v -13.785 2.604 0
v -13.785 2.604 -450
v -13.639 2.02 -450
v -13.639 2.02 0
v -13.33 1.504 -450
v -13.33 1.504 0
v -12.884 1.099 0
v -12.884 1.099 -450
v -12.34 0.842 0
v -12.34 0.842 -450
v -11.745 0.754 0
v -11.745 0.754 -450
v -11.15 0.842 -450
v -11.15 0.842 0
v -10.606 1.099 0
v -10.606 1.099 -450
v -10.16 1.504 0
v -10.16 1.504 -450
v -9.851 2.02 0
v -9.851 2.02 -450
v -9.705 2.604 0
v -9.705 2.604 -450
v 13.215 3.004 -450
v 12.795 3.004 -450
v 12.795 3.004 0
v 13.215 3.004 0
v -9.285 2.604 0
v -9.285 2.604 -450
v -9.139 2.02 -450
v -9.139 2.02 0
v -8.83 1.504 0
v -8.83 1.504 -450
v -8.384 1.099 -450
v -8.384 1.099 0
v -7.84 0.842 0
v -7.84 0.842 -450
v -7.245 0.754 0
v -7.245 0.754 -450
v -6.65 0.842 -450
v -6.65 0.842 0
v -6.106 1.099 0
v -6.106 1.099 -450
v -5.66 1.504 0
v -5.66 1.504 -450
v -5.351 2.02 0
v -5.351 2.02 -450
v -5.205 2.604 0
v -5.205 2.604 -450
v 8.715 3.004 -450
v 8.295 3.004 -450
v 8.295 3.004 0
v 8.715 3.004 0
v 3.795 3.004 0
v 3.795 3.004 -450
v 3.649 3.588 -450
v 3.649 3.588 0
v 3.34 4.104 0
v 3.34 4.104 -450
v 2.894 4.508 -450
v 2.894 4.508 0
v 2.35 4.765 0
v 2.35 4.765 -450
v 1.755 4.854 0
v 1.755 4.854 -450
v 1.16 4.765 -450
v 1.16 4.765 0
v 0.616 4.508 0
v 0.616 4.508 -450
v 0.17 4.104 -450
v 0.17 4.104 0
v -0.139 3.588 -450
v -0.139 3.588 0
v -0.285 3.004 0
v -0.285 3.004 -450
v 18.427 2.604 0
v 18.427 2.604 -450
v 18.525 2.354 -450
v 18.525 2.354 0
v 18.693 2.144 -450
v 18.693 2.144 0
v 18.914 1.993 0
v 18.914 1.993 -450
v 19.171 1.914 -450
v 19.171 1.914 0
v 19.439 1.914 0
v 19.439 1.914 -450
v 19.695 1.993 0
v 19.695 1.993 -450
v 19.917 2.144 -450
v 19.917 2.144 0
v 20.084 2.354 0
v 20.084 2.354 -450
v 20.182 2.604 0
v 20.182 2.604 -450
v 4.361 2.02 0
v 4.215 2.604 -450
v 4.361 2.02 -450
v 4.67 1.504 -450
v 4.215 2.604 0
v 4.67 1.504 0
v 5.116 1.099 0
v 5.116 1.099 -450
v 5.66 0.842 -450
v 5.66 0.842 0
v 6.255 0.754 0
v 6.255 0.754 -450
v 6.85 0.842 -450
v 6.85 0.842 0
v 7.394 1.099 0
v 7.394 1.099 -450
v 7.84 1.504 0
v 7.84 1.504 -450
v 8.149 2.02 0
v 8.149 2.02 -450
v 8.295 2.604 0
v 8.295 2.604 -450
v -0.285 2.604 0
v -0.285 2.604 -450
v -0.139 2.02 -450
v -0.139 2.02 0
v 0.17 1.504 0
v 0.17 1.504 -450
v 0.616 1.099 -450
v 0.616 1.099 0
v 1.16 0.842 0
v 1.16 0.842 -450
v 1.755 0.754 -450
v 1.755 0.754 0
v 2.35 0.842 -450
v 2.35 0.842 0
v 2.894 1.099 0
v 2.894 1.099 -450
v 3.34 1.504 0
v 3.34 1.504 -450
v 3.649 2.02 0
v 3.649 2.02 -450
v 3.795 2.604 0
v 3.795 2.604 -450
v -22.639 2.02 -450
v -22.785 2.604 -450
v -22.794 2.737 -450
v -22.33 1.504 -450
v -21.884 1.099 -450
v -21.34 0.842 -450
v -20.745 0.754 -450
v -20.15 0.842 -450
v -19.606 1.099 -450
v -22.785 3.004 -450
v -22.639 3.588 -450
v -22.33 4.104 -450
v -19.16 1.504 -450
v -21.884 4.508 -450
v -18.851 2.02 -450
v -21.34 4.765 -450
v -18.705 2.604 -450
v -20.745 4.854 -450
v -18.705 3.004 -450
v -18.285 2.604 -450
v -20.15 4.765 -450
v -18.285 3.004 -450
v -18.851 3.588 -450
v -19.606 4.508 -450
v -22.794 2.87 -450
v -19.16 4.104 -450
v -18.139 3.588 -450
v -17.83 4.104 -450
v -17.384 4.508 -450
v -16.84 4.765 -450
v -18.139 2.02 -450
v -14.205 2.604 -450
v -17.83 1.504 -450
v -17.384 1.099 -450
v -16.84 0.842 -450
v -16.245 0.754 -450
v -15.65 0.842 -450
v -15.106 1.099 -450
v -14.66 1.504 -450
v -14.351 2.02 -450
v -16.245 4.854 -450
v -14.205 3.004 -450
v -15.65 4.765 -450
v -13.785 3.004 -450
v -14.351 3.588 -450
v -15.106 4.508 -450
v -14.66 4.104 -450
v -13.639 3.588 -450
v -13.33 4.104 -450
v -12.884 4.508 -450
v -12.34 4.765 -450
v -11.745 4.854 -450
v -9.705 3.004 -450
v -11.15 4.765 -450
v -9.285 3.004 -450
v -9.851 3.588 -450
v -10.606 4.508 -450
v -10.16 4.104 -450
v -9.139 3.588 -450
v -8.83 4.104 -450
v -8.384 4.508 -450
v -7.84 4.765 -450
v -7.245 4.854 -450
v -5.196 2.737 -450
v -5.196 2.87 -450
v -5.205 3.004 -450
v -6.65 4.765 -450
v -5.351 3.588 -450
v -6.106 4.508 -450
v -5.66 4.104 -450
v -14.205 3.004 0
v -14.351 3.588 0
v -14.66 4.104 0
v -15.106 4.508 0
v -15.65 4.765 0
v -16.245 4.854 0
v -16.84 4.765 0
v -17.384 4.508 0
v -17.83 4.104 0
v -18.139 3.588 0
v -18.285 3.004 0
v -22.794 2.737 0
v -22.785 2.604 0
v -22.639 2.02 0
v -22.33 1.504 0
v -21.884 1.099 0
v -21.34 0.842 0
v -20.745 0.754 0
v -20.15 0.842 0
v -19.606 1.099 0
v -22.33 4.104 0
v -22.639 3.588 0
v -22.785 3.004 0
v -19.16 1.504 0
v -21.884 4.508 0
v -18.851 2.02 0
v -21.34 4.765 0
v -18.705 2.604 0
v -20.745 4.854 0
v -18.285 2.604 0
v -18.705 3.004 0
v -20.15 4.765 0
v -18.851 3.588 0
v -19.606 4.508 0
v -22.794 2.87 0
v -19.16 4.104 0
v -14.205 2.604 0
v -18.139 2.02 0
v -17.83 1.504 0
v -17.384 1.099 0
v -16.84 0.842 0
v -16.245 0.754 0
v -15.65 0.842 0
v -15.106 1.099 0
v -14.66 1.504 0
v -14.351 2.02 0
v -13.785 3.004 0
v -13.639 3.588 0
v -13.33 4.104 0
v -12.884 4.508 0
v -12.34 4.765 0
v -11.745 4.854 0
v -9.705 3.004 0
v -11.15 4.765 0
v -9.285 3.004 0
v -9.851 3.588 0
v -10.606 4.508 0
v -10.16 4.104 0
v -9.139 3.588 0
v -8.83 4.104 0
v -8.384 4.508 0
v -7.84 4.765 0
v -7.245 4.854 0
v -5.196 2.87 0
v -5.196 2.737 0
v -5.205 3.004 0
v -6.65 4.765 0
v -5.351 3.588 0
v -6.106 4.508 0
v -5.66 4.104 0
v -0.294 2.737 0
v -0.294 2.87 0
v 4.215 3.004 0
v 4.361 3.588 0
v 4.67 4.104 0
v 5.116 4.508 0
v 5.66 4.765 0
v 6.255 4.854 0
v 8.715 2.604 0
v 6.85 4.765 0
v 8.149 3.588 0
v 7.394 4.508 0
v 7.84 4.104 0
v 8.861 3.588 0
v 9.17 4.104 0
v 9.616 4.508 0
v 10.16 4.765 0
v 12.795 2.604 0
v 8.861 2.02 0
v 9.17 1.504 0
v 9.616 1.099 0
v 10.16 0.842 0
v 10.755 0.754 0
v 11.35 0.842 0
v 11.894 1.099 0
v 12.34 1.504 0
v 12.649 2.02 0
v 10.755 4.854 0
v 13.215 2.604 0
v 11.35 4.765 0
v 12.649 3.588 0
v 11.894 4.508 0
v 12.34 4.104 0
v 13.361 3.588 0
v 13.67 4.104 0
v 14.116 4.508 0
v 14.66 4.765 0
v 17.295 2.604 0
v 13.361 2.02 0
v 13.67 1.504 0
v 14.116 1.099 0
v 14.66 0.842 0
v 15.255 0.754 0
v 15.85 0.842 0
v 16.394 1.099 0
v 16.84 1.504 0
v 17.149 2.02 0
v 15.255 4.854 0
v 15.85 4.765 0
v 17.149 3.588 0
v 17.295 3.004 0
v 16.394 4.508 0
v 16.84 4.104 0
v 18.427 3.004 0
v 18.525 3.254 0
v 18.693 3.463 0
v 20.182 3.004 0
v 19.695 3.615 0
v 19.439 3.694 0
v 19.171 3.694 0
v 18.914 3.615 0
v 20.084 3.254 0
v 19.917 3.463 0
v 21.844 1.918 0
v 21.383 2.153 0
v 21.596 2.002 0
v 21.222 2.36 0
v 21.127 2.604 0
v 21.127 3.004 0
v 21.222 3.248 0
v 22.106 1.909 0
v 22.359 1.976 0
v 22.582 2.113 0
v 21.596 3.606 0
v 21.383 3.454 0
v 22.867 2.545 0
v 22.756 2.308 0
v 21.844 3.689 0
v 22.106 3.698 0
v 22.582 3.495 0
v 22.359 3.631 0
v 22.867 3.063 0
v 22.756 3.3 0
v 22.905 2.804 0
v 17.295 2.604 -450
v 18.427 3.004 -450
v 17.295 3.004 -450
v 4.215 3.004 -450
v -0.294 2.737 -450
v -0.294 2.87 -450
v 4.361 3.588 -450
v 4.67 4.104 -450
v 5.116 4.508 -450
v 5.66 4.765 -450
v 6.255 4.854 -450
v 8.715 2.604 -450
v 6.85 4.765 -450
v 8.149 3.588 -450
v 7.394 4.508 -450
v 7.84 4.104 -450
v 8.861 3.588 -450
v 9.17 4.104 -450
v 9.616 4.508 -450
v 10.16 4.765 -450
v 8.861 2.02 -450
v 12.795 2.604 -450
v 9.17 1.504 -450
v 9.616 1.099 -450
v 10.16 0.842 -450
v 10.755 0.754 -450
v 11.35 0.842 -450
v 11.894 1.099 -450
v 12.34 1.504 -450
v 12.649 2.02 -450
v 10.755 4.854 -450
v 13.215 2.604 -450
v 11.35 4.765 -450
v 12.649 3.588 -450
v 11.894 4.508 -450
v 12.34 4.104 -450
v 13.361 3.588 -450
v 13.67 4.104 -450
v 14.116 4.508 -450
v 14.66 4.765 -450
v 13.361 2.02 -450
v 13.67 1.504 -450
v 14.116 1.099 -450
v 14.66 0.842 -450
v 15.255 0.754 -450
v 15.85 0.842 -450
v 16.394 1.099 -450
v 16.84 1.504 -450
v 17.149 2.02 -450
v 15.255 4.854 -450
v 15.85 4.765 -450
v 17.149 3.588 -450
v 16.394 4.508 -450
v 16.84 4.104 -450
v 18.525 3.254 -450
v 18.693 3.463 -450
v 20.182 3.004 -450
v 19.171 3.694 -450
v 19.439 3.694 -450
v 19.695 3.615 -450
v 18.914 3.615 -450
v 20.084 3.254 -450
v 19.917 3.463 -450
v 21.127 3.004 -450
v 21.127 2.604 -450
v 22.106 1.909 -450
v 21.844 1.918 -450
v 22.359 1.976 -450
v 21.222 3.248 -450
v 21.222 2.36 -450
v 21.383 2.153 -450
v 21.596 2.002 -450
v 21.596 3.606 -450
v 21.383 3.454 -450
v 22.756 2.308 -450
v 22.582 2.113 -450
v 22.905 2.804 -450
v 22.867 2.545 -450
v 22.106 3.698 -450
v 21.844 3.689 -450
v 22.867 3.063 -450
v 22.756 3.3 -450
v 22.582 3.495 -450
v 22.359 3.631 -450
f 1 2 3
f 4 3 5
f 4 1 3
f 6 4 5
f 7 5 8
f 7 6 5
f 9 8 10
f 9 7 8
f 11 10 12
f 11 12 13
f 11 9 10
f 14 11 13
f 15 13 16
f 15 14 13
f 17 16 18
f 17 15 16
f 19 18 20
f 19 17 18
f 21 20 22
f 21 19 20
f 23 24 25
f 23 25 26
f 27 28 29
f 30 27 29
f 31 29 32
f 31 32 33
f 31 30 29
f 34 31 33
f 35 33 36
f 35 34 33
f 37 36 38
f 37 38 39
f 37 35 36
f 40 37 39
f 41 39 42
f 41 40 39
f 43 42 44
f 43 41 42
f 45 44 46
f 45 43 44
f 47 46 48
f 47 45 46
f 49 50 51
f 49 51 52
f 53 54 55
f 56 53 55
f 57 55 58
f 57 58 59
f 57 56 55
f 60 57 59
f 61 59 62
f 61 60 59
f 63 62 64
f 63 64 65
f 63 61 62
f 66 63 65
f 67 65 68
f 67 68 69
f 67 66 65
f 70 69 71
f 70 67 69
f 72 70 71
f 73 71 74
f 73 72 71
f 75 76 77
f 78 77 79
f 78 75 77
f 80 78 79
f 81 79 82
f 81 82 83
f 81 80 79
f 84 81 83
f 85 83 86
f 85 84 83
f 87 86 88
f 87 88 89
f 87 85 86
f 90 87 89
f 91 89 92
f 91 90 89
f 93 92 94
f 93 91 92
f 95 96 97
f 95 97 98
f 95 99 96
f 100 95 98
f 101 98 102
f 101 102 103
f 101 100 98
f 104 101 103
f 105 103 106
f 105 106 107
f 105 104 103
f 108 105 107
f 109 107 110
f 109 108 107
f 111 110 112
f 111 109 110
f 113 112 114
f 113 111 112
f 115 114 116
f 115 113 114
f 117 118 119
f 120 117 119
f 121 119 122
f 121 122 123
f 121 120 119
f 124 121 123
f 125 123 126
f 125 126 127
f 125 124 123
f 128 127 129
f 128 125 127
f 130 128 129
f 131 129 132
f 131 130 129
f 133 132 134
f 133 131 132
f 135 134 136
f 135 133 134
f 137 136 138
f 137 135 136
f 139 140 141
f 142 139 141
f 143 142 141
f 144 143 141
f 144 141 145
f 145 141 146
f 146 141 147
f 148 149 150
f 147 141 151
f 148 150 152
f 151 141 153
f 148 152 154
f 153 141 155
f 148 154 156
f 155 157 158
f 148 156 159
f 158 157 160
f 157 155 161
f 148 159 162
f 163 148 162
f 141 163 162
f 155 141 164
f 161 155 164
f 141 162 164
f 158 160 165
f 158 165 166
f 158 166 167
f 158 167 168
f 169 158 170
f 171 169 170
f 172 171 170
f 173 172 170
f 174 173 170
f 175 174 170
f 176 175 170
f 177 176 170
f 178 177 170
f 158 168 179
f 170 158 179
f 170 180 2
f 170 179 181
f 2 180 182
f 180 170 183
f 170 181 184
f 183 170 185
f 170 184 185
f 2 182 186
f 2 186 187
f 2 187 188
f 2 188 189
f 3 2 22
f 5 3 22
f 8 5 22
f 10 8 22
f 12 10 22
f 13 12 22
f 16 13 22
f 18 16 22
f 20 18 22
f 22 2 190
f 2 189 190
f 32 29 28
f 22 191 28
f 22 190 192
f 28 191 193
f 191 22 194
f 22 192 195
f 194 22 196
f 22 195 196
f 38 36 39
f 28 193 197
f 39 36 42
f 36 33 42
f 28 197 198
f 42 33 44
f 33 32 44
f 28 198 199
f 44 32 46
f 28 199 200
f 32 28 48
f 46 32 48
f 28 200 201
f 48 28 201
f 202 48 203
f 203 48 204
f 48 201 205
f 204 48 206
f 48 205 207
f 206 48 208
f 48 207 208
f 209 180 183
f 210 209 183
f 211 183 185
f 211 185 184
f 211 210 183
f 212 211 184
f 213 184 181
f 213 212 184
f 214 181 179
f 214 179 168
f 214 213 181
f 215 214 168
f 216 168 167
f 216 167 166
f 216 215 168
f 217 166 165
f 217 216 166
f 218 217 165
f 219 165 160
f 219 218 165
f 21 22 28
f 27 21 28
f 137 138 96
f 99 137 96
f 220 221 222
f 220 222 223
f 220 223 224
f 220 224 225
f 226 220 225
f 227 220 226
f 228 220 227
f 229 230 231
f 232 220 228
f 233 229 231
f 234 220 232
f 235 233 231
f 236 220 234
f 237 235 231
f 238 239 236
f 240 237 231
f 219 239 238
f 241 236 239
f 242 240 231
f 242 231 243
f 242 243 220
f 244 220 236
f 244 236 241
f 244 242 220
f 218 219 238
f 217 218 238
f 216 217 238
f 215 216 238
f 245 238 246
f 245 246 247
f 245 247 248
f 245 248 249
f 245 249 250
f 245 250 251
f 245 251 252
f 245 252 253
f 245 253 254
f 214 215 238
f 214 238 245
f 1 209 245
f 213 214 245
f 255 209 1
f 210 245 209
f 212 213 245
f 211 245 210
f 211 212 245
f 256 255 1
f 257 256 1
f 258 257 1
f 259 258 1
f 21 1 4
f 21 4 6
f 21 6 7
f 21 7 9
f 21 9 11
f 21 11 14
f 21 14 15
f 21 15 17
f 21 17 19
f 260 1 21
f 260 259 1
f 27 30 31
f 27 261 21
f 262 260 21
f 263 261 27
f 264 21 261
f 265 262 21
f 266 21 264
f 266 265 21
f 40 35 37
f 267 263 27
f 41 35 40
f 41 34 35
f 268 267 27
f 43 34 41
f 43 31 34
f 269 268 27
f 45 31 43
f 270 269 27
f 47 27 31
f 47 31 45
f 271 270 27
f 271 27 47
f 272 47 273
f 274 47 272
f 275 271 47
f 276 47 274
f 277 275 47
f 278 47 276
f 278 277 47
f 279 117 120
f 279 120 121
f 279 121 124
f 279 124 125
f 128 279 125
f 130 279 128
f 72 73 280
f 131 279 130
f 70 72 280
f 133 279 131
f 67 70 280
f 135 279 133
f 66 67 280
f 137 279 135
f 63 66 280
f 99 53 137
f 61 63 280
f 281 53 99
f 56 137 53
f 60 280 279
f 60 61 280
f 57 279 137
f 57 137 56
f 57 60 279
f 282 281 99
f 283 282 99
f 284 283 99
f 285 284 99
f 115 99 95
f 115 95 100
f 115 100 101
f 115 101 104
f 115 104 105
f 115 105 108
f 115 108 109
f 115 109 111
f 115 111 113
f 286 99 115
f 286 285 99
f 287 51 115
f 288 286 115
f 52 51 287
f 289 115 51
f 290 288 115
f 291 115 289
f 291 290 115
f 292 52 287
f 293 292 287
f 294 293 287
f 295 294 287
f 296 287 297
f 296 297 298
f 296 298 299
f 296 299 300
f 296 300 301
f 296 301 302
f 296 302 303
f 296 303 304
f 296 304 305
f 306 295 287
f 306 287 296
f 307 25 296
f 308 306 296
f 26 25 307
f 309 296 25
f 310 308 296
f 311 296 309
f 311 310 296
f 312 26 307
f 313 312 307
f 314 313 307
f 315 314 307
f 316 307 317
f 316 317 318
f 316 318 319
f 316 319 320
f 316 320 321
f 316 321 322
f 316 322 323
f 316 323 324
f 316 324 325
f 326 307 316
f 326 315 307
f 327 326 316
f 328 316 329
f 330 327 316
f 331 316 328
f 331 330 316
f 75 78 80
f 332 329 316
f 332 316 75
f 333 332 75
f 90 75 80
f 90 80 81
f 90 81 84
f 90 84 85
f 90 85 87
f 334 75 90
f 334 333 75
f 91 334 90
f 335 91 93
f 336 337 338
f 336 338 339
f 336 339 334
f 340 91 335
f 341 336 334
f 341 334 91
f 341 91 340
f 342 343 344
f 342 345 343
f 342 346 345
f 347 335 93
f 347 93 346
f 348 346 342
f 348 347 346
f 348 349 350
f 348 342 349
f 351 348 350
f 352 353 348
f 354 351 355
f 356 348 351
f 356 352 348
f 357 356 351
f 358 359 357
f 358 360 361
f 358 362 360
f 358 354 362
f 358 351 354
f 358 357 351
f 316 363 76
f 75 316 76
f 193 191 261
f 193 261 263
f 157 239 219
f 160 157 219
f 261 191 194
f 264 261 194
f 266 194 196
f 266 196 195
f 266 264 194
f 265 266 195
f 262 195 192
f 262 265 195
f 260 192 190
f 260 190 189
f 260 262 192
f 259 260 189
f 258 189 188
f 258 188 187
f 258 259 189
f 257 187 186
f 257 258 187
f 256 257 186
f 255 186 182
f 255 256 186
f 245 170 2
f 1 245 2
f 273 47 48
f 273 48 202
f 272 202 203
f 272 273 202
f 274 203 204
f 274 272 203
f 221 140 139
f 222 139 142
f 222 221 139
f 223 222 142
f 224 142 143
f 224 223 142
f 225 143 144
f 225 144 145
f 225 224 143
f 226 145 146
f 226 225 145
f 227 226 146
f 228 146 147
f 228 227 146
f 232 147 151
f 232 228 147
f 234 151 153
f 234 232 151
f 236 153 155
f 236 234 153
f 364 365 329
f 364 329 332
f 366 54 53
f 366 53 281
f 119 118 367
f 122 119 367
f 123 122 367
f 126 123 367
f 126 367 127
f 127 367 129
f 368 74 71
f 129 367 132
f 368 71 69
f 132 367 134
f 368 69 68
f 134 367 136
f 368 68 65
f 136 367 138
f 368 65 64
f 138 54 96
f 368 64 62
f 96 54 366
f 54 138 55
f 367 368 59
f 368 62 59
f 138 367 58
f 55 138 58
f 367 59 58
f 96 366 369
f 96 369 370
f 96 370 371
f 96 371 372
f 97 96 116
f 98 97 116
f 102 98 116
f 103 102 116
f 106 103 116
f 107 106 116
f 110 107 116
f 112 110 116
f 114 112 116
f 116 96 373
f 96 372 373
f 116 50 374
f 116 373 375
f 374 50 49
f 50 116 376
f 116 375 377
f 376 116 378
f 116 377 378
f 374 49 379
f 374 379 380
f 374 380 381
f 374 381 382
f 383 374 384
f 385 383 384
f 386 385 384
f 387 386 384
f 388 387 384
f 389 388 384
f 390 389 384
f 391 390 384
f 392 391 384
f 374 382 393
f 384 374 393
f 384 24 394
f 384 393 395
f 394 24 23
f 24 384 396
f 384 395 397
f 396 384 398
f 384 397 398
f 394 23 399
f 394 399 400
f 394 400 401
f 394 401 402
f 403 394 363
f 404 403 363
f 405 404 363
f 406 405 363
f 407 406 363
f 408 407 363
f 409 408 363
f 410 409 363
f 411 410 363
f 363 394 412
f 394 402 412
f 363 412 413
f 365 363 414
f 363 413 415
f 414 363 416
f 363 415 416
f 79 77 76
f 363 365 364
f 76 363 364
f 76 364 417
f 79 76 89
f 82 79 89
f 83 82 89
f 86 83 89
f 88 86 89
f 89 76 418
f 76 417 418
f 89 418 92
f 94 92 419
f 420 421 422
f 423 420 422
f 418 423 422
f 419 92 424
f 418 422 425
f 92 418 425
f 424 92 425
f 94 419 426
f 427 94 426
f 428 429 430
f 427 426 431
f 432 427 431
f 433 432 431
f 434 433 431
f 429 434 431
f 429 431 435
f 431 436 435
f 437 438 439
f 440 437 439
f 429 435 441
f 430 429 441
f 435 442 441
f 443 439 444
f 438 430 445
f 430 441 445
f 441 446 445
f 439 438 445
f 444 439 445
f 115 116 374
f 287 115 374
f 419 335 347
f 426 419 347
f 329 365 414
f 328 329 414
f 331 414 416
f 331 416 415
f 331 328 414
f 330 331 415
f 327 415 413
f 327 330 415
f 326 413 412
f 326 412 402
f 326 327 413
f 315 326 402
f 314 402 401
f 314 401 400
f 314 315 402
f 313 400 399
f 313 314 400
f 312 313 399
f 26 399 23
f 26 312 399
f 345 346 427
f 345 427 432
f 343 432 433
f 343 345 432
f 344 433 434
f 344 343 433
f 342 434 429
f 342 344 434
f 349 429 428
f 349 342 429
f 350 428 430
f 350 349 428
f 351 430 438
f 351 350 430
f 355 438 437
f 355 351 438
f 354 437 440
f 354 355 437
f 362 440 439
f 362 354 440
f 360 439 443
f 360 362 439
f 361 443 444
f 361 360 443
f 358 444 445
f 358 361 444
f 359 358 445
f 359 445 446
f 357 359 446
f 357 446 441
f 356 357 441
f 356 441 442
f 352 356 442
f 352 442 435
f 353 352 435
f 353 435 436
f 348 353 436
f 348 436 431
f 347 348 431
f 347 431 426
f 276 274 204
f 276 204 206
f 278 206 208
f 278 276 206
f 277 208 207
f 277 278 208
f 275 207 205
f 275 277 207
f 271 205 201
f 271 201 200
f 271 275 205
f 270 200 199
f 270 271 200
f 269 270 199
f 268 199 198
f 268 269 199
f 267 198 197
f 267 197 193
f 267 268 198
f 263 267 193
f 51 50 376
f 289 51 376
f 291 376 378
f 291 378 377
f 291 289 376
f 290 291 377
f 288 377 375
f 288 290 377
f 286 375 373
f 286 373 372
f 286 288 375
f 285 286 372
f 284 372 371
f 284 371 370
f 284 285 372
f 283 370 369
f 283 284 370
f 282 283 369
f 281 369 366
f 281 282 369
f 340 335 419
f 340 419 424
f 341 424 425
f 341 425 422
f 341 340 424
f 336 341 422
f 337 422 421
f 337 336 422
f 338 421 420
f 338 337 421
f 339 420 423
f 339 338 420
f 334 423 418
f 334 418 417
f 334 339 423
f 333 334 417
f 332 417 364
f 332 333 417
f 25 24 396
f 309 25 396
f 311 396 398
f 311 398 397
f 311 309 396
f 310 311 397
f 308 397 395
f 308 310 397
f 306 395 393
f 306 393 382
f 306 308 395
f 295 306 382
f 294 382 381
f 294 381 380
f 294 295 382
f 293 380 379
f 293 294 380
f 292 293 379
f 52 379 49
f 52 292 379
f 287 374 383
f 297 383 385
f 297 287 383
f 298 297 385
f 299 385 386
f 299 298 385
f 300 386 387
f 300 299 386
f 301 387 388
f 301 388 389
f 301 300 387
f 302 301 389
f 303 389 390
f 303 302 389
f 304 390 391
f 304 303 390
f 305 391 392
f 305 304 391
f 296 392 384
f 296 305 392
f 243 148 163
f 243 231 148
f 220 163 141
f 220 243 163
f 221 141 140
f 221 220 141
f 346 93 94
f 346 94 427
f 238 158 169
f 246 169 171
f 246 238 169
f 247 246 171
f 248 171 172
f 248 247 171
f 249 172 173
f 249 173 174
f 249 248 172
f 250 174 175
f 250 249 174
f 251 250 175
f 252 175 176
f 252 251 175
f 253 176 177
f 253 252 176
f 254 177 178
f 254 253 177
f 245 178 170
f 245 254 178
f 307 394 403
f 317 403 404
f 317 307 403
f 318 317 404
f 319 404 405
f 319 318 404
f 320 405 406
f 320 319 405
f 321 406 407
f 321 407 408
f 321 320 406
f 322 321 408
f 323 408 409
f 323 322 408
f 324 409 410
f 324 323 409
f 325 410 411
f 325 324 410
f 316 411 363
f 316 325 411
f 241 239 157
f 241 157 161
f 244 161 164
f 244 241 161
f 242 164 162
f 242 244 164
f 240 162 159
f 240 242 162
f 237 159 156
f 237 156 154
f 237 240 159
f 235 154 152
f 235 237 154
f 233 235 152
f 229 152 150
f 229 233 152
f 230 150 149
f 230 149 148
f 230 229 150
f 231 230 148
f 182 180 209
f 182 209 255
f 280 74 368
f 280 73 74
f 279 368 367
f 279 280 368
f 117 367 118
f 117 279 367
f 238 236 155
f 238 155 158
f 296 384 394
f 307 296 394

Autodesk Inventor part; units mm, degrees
ref_plane "YZ Plane" through (0, 0, 0) normal (1, 0, 0) x (0, 1, 0)
ref_plane "XZ Plane" through (0, 0, 0) normal (0, 1, 0) x (-1, 0, 0)
sketch "Sketch1" plane through (0, 0, 0) normal (0, 0, 1) x (1, 0, 0)
  line L0 (34.8824, 2.8037) -> (34.8824, -2.1963) projected
  line L1 (28.8824, 2.8037) -> (34.8824, 2.8037) projected
  line L2 (28.8824, 2.6037) -> (28.8824, 2.8037) projected
  line L3 (22.8824, 2.6037) -> (28.8824, 2.6037) projected
  arc A0 (21.1274, 2.6037) -> (22.8824, 2.6037) centre (22.0049, 2.8037) ccw projected
  line L4 (20.1824, 2.6037) -> (21.1274, 2.6037) projected
  arc A1 (18.4274, 2.6037) -> (20.1824, 2.6037) centre (19.3049, 2.8037) ccw projected
  line L5 (17.2951, 2.6037) -> (18.4274, 2.6037) projected
  arc A2 (13.2146, 2.6037) -> (17.2951, 2.6037) centre (15.2549, 2.8037) ccw projected
  line L6 (12.7951, 2.6037) -> (13.2146, 2.6037) projected
  arc A3 (8.7146, 2.6037) -> (12.7951, 2.6037) centre (10.7549, 2.8037) ccw projected
  line L7 (8.2951, 2.6037) -> (8.7146, 2.6037) projected
  arc A4 (4.2146, 2.6037) -> (8.2951, 2.6037) centre (6.2549, 2.8037) ccw projected
  line L8 (3.7951, 2.6037) -> (4.2146, 2.6037) projected
  arc A5 (-0.2854, 2.6037) -> (3.7951, 2.6037) centre (1.7549, 2.8037) ccw projected
  line L9 (-5.2049, 2.6037) -> (-0.2854, 2.6037) projected
  arc A6 (-9.2854, 2.6037) -> (-5.2049, 2.6037) centre (-7.2451, 2.8037) ccw projected
  line L10 (-9.7049, 2.6037) -> (-9.2854, 2.6037) projected
  arc A7 (-13.7854, 2.6037) -> (-9.7049, 2.6037) centre (-11.7451, 2.8037) ccw projected
  line L11 (-14.2049, 2.6037) -> (-13.7854, 2.6037) projected
  arc A8 (-18.2854, 2.6037) -> (-14.2049, 2.6037) centre (-16.2451, 2.8037) ccw projected
  line L12 (-18.7049, 2.6037) -> (-18.2854, 2.6037) projected
  arc A9 (-22.7854, 2.6037) -> (-18.7049, 2.6037) centre (-20.7451, 2.8037) ccw projected
  line L13 (-28.7854, 2.6037) -> (-22.7854, 2.6037) projected
  line L14 (-28.7854, 2.8037) -> (-28.7854, 2.6037) projected
  line L15 (-34.7854, 2.8037) -> (-28.7854, 2.8037) projected
  line L16 (-34.7854, -2.1963) -> (-34.7854, 2.8037) projected
  line L17 (34.8824, -2.1963) -> (-34.7854, -2.1963) projected
  line L18 (34.8824, 2.8037) -> (34.8824, 7.8037) projected
  line L19 (34.8824, 7.8037) -> (-34.7854, 7.8037) projected
  line L20 (-34.7854, 7.8037) -> (-34.7854, 2.8037) projected
  line L21 (-34.7854, 2.8037) -> (-28.7854, 2.8037) projected
  line L22 (-28.7854, 2.8037) -> (-28.7854, 3.0037) projected
  line L23 (-28.7854, 3.0037) -> (-22.7854, 3.0037) projected
  arc A10 (-18.7049, 3.0037) -> (-22.7854, 3.0037) centre (-20.7451, 2.8037) ccw projected
  line L24 (-18.7049, 3.0037) -> (-18.2854, 3.0037) projected
  arc A11 (-14.2049, 3.0037) -> (-18.2854, 3.0037) centre (-16.2451, 2.8037) ccw projected
  line L25 (-14.2049, 3.0037) -> (-13.7854, 3.0037) projected
  arc A12 (-9.7049, 3.0037) -> (-13.7854, 3.0037) centre (-11.7451, 2.8037) ccw projected
  line L26 (-9.7049, 3.0037) -> (-9.2854, 3.0037) projected
  arc A13 (-5.2049, 3.0037) -> (-9.2854, 3.0037) centre (-7.2451, 2.8037) ccw projected
  line L27 (-5.2049, 3.0037) -> (-0.2854, 3.0037) projected
  arc A14 (3.7951, 3.0037) -> (-0.2854, 3.0037) centre (1.7549, 2.8037) ccw projected
  line L28 (3.7951, 3.0037) -> (4.2146, 3.0037) projected
  arc A15 (8.2951, 3.0037) -> (4.2146, 3.0037) centre (6.2549, 2.8037) ccw projected
  line L29 (8.2951, 3.0037) -> (8.7146, 3.0037) projected
  arc A16 (12.7951, 3.0037) -> (8.7146, 3.0037) centre (10.7549, 2.8037) ccw projected
  line L30 (12.7951, 3.0037) -> (13.2146, 3.0037) projected
  arc A17 (17.2951, 3.0037) -> (13.2146, 3.0037) centre (15.2549, 2.8037) ccw projected
  line L31 (17.2951, 3.0037) -> (18.4274, 3.0037) projected
  arc A18 (20.1824, 3.0037) -> (18.4274, 3.0037) centre (19.3049, 2.8037) ccw projected
  line L32 (20.1824, 3.0037) -> (21.1274, 3.0037) projected
  arc A19 (22.8824, 3.0037) -> (21.1274, 3.0037) centre (22.0049, 2.8037) ccw projected
  line L33 (22.8824, 3.0037) -> (28.8824, 3.0037) projected
  line L34 (28.8824, 3.0037) -> (28.8824, 2.8037) projected
  line L35 (28.8824, 2.8037) -> (34.8824, 2.8037) projected
  arc A20 (21.1274, 2.6037) -> (21.1274, 3.0037) centre (22.0049, 2.8037) ccw
  arc A21 (-18.7049, 3.0037) -> (-18.7049, 2.6037) centre (-20.7451, 2.8037) ccw
  arc A22 (3.7951, 3.0037) -> (3.7951, 2.6037) centre (1.7549, 2.8037) ccw
  arc A23 (-9.2854, 2.6037) -> (-9.2854, 3.0037) centre (-7.2451, 2.8037) ccw
  point P0 (0, 0)
ref_plane "Work Plane1" through (-34.7854, -2.1963, -450) normal (0, 0, -1) x (0, 1, 0)
extrude "Extrusion1" add sketch "Sketch1" against normal up to surface (450 mm away) contours A0 L4 A1 L5 A2 L6 A3 L7 A4 L8 A5 A22 A14 L28 A15 L29 A16 L30 A17 L31 A18 L32 A19 A20 | A21 A10 L24 A11 L25 A12 L26 A13 A23 A6 L10 A7 L11 A8 L12 A9
properties part number "3d_LM - Bottom Wire - Phantom"
